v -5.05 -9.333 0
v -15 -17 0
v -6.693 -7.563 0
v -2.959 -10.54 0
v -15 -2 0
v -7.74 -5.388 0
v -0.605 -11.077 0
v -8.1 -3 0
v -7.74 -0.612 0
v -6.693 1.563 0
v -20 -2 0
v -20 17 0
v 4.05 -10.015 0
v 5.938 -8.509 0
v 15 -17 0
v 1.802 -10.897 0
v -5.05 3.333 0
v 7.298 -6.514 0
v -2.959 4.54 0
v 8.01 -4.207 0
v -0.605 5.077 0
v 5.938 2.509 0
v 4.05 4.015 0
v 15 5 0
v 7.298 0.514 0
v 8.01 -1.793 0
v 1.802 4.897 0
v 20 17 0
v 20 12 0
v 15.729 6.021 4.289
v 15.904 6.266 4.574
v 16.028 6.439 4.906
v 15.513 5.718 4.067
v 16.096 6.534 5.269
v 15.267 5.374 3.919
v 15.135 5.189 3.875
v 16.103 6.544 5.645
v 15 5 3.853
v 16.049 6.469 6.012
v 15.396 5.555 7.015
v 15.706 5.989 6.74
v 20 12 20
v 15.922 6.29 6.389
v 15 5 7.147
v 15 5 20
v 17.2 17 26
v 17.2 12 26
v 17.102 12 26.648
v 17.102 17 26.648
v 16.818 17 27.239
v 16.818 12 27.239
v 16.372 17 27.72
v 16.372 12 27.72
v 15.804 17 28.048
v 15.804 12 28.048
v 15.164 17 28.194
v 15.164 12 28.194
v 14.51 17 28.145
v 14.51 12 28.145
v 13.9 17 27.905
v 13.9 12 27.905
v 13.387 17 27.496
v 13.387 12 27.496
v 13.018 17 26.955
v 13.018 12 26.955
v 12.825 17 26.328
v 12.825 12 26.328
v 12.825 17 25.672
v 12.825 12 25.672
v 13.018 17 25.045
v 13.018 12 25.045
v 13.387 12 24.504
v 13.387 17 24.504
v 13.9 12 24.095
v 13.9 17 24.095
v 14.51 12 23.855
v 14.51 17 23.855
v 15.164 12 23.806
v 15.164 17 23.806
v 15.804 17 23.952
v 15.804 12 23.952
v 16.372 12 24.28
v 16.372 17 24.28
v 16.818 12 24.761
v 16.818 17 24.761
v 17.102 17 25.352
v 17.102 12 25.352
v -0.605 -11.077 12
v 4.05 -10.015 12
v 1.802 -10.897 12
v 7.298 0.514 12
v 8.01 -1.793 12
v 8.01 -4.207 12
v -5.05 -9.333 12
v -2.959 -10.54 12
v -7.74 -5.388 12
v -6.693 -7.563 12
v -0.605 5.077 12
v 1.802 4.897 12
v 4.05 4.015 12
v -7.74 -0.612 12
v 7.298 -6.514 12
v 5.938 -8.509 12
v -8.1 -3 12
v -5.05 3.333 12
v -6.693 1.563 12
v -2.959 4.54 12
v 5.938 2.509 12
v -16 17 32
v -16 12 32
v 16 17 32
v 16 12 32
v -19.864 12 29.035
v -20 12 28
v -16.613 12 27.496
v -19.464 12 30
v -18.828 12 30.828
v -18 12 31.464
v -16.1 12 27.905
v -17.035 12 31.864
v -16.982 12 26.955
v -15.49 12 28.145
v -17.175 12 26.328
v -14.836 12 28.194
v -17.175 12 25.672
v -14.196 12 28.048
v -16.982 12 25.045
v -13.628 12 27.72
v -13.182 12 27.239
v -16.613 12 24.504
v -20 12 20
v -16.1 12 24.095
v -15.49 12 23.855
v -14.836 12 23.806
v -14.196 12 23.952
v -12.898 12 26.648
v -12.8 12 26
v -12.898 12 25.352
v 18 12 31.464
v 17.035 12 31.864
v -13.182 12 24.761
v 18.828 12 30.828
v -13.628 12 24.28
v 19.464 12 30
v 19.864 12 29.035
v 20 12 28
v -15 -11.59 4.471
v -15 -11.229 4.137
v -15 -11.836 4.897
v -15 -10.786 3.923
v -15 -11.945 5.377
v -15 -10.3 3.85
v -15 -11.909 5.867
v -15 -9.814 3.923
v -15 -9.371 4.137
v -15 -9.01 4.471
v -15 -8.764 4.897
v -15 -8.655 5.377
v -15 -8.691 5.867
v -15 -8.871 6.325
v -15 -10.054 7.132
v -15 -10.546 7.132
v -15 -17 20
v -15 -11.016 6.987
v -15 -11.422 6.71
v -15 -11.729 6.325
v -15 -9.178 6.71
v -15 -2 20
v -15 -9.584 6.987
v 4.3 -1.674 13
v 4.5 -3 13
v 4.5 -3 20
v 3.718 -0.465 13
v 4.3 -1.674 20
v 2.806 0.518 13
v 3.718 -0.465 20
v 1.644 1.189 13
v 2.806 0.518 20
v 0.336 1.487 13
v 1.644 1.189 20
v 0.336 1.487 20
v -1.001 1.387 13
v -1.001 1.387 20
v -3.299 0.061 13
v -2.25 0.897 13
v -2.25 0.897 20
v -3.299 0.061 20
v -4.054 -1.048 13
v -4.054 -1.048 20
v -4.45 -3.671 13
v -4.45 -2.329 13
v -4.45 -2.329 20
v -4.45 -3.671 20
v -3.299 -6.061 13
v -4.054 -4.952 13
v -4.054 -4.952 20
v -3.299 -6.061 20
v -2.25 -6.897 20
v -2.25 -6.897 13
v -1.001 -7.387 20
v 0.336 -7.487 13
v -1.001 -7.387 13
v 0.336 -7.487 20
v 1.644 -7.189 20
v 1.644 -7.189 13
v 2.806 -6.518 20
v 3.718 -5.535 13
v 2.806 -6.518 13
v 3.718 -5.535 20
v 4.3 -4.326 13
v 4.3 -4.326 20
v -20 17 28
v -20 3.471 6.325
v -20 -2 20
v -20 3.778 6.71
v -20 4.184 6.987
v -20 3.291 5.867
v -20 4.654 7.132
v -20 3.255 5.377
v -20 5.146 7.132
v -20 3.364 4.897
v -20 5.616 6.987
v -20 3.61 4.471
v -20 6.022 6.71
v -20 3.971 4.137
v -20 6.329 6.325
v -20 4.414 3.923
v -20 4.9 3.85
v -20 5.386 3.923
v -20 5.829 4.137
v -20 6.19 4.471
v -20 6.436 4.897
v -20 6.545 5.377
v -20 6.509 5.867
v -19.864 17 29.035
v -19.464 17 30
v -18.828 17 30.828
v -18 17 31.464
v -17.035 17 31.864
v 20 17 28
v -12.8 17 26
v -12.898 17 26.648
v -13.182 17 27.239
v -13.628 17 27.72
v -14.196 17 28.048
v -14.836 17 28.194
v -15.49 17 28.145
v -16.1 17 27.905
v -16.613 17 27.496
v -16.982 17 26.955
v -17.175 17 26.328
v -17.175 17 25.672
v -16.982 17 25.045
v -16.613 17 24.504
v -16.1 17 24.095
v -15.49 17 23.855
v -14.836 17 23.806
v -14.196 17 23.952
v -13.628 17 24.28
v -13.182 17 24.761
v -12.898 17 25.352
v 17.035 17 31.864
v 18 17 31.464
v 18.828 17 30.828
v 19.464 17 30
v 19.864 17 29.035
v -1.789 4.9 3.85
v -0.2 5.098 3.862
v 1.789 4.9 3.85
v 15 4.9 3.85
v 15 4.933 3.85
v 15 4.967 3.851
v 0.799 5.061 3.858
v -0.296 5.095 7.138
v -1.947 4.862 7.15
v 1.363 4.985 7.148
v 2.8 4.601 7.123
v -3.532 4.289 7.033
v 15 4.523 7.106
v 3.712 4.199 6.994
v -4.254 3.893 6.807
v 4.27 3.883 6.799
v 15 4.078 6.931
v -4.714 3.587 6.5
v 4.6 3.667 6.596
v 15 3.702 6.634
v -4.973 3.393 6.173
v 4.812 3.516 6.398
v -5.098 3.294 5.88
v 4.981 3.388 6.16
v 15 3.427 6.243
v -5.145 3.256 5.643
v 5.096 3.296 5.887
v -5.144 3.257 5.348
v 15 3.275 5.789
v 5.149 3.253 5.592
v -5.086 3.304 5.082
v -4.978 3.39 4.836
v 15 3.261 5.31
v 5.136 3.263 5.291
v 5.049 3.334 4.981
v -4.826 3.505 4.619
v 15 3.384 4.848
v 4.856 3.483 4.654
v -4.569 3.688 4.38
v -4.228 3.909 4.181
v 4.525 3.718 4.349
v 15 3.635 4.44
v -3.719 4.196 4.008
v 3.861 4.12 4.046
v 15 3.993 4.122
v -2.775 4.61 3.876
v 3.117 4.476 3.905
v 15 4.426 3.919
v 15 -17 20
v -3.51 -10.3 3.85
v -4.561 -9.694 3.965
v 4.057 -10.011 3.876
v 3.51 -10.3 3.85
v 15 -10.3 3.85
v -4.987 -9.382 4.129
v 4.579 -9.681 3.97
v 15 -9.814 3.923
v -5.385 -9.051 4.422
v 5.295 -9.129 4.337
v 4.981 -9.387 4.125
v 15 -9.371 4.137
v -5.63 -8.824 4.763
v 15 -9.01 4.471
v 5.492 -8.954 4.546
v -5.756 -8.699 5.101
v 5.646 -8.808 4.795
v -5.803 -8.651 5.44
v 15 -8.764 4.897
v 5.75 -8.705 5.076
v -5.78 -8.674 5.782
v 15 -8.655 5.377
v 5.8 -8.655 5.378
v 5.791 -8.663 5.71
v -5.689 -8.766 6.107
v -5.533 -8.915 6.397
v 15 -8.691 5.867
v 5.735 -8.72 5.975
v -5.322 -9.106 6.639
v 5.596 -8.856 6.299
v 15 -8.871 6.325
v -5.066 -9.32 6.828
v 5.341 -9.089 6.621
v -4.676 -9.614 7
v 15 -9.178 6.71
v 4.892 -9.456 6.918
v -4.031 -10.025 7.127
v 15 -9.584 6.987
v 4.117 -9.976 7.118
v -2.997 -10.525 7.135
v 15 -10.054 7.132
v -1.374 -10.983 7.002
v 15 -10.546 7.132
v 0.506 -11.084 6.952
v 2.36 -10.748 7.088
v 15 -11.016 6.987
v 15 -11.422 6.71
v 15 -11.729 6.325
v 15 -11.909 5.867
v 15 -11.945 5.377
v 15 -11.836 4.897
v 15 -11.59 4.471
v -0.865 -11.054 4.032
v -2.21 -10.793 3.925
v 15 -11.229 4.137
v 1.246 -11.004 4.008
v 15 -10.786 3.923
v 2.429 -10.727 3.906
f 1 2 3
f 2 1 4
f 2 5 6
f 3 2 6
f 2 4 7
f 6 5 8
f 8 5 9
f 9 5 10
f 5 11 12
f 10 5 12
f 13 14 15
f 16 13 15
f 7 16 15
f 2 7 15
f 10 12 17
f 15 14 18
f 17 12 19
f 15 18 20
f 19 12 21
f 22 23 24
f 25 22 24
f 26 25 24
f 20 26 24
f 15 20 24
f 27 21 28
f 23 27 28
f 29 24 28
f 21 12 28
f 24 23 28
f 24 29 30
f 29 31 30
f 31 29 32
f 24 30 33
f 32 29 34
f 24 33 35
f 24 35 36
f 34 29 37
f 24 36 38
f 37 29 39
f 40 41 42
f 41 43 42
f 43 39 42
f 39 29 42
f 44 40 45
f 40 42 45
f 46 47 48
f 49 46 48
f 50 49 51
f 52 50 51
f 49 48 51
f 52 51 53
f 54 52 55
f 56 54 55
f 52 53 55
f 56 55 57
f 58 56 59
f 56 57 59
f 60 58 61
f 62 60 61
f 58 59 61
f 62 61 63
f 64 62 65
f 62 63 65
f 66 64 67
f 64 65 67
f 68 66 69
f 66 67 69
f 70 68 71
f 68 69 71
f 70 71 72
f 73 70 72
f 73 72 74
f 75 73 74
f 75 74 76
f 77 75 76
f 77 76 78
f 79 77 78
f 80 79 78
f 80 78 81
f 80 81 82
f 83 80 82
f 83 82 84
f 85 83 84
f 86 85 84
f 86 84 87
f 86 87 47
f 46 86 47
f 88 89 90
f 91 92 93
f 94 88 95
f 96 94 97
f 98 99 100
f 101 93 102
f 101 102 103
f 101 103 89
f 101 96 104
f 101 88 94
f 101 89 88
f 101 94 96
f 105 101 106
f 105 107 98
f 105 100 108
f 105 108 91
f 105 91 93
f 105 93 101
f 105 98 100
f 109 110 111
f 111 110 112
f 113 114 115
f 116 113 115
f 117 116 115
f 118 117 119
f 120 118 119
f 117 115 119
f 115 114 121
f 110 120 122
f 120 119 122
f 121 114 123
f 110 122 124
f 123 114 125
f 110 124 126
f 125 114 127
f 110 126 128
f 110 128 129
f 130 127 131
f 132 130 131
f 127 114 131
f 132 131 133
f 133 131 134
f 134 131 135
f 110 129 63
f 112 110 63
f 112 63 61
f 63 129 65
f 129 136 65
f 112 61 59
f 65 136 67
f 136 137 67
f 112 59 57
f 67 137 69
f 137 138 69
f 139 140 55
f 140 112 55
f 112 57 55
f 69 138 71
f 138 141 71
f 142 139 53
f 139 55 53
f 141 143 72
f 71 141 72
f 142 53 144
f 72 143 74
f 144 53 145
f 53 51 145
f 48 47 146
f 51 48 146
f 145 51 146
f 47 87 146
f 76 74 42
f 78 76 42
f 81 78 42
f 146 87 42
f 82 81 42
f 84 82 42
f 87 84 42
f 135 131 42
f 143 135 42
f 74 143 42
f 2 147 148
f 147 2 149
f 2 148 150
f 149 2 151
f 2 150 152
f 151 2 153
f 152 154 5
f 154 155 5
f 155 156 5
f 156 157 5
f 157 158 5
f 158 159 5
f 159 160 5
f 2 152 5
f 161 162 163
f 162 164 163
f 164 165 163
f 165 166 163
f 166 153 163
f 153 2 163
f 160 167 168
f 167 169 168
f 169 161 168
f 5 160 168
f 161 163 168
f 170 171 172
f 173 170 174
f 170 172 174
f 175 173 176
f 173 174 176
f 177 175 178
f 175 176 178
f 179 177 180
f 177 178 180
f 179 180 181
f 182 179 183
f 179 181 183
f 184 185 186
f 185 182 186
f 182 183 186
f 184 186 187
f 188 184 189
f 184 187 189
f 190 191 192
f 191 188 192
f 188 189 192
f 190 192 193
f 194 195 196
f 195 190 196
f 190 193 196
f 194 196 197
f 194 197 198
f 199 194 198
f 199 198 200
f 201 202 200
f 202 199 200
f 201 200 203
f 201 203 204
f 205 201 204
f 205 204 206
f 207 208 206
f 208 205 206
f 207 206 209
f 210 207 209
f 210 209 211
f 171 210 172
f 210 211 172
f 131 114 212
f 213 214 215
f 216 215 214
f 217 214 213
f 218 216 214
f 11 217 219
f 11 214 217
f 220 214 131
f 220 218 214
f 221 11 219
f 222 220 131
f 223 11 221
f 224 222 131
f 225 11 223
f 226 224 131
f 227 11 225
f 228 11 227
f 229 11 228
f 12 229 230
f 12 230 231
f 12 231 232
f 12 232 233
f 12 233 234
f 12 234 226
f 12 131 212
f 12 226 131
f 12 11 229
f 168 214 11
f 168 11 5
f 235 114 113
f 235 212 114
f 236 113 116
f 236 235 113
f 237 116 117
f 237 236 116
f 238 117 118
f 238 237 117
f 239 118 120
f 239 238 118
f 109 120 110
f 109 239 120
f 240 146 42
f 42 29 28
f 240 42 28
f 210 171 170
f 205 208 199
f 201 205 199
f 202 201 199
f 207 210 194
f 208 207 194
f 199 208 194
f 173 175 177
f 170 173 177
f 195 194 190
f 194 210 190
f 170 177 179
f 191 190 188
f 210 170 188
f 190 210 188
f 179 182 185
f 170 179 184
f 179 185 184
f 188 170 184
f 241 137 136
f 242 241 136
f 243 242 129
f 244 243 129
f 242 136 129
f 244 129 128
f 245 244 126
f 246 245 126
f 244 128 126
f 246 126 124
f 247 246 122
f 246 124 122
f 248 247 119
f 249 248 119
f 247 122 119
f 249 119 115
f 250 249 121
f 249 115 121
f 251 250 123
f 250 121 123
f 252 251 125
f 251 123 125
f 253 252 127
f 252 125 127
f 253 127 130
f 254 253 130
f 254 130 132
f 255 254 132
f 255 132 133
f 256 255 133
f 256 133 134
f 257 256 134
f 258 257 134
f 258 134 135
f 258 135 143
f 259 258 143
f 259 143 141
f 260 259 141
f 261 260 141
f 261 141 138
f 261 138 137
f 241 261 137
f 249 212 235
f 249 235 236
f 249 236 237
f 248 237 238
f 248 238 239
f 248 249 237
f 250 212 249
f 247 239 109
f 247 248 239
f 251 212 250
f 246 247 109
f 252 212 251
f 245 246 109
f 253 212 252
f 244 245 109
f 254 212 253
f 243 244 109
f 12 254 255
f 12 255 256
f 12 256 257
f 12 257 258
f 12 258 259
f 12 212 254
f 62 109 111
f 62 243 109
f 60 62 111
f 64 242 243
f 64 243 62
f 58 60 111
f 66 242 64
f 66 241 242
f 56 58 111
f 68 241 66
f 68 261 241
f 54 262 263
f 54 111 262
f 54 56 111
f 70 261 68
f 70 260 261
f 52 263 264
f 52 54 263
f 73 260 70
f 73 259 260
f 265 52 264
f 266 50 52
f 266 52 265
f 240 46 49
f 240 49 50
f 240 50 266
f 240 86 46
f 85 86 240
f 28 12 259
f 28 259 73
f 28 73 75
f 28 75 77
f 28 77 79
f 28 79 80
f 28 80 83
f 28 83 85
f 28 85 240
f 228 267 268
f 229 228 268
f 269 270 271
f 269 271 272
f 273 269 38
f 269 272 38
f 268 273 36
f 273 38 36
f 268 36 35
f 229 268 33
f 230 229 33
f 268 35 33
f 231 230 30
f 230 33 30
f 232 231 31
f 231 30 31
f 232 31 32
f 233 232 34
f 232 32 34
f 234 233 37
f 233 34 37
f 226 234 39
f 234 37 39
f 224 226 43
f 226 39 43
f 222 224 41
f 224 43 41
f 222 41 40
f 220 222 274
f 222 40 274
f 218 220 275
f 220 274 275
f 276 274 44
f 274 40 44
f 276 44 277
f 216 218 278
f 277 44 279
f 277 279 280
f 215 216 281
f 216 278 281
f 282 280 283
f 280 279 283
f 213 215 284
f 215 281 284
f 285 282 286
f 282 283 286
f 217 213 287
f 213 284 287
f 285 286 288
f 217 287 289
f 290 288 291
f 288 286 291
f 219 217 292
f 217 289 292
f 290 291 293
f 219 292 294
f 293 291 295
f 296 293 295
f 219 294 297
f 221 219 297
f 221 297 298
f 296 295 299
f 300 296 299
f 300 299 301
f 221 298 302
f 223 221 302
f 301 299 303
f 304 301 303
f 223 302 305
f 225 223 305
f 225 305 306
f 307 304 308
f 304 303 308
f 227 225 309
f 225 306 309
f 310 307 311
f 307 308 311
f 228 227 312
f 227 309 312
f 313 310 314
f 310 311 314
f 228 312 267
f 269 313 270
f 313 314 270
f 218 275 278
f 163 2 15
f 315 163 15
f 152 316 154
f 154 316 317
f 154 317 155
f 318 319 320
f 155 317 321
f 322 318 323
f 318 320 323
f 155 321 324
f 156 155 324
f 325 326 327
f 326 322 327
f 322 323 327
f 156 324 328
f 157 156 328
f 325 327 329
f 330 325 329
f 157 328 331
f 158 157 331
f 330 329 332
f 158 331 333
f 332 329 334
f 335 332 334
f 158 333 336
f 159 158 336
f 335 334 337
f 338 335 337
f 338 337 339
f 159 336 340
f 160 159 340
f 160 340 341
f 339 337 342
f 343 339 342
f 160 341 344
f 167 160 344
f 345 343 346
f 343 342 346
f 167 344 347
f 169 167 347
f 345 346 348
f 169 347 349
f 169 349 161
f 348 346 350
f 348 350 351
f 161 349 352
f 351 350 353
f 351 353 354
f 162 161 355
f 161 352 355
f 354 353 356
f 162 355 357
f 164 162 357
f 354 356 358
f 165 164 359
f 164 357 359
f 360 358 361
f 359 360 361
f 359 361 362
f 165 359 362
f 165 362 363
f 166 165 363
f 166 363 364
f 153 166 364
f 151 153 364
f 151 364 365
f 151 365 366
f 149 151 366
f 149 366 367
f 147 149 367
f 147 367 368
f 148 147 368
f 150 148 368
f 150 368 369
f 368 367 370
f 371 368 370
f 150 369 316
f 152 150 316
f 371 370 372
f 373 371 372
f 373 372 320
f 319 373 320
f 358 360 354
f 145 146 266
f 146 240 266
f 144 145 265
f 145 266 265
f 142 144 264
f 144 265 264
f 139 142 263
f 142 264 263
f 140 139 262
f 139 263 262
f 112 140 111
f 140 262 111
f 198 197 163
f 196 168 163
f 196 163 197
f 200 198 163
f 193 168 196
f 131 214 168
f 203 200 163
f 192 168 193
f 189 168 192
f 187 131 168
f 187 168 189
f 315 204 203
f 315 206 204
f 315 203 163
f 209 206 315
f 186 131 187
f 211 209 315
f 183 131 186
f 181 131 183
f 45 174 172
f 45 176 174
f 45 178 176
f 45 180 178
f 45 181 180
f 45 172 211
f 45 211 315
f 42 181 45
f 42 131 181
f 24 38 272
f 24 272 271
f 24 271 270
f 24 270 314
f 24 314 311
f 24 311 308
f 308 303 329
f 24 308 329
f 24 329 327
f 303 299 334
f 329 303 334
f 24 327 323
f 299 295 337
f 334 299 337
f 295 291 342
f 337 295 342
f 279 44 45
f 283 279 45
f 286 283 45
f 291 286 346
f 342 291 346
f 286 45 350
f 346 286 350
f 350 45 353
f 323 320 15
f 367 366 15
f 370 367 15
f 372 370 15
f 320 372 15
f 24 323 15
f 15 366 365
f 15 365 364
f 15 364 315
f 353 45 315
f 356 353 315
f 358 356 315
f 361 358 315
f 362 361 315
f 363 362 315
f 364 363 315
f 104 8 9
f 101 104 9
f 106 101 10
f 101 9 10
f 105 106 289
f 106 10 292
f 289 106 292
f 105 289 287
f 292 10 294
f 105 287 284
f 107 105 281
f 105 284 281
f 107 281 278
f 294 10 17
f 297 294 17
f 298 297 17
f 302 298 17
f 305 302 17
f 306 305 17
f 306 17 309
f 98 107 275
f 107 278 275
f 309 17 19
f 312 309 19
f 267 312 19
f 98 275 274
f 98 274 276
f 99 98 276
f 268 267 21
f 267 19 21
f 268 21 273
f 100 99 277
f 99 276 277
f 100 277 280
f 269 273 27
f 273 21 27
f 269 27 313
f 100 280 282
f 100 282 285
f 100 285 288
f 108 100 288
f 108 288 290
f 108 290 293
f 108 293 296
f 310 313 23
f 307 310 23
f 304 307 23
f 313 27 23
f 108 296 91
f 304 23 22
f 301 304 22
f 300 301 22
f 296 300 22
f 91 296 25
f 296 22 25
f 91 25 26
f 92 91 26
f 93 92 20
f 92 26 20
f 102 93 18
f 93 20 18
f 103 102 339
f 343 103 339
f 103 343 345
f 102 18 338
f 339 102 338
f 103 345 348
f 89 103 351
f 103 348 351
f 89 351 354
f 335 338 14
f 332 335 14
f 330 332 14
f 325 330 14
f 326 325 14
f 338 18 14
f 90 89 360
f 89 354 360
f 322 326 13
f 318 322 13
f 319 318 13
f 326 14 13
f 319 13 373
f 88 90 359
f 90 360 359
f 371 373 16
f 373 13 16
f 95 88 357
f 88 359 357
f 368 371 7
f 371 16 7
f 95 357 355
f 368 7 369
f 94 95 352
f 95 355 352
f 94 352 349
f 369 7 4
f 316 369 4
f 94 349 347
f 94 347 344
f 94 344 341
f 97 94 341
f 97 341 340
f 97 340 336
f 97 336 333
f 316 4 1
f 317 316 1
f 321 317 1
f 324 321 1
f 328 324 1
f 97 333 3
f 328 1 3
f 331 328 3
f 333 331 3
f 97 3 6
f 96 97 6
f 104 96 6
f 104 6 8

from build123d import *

# Parameters (mm, degrees)
ESQUISSE1_W                  = 40
ESQUISSE1_H                  = 34
BOSS_EXTRU_1_DEPTH           = 20
ESQUISSE2_W                  = 40
ESQUISSE2_H                  = 5
BOSS_EXTRU_3_DEPTH           = 20
ESQUISSE4_R                  = 4.5
ENL_V_MAT_EXTRU_1_DEPTH      = 21
ESQUISSE5_R                  = 8.1
ENL_V_MAT_EXTRU_2_DEPTH      = 12
ENL_V_MAT_EXTRU_3_DEPTH      = 21
ESQUISSE8_R                  = 2.2
ENL_V_MAT_EXTRU_5_DEPTH      = 6
ESQUISSE10_R                 = 4.5
BOSS_EXTRU_4_DEPTH           = 1
ESQUISSE11_W                 = 40
ESQUISSE11_H                 = 8
ENL_V_MAT_EXTRU_6_DEPTH      = 6
CONG_6_R                     = 4
ESQUISSE14_R                 = 1.65
ENL_V_MAT_EXTRU_7_DEPTH      = 6
ENL_V_MAT_EXTRU_7_DEPTH_BACK = 36


with BuildPart() as part:
    # Esquisse1 → Boss.-Extru.1 (new body)
    with BuildSketch(Plane.XY):
        Rectangle(ESQUISSE1_W, ESQUISSE1_H)
    extrude(amount=BOSS_EXTRU_1_DEPTH)

    # Esquisse2 → Boss.-Extru.3 (add)
    with BuildSketch(Plane.XY.offset(20)):
        with Locations((0, 14.5)):
            Rectangle(ESQUISSE2_W, ESQUISSE2_H)
    extrude(amount=BOSS_EXTRU_3_DEPTH)

    # Esquisse4 → Enlèv. mat.-Extru.1 (cut, through all)
    with BuildSketch(Plane.XY.offset(20)):
        with Locations((0, -3)):
            Circle(ESQUISSE4_R)
    extrude(amount=-ENL_V_MAT_EXTRU_1_DEPTH, mode=Mode.SUBTRACT)

    # Esquisse5 → Enlèv. mat.-Extru.2 (cut)
    with BuildSketch(Plane(origin=(0, 0, 0), x_dir=(-1, 0, 0), z_dir=(0, 0, -1))):
        with Locations((0, -3)):
            Circle(ESQUISSE5_R)
    extrude(amount=-ENL_V_MAT_EXTRU_2_DEPTH, mode=Mode.SUBTRACT)

    # Esquisse6 → Enlèv. mat.-Extru.3 (cut, through all)
    with BuildSketch(Plane.XY.offset(20)):
        Polygon((-20, -17), (-20, -2), (-15, -2), (-15, -7), (-15, -17), align=None)
        Polygon((20, 12), (15, 5), (15, -17), (20, -17), align=None)
    extrude(amount=-ENL_V_MAT_EXTRU_3_DEPTH, mode=Mode.SUBTRACT)

    # Esquisse8 → Enlèv. mat.-Extru.5 (cut, through all)
    with BuildSketch(Plane.XZ.offset(-12)):
        with Locations((-15, 26)):
            Circle(ESQUISSE8_R)
        with Locations((15, 26)):
            Circle(ESQUISSE8_R)
    extrude(amount=-ENL_V_MAT_EXTRU_5_DEPTH, mode=Mode.SUBTRACT)

    # Esquisse10 → Boss.-Extru.4 (add)
    with BuildSketch(Plane(origin=(0, 0, 12), x_dir=(-1, 0, 0), z_dir=(0, 0, -1))):
        with Locations((0, -3)):
            Circle(ESQUISSE10_R)
    extrude(amount=-BOSS_EXTRU_4_DEPTH)

    # Esquisse11 → Enlèv. mat.-Extru.6 (cut, through all)
    with BuildSketch(Plane.XZ.offset(-12)):
        with Locations((0, 36)):
            Rectangle(ESQUISSE11_W, ESQUISSE11_H)
    extrude(amount=-ENL_V_MAT_EXTRU_6_DEPTH, mode=Mode.SUBTRACT)

    # Congé6
    cong_6_edges = [part.edges().sort_by_distance(p)[0] for p in [
        (-20, 14.5, 32),
        (20, 14.5, 32),
    ]]
    fillet(cong_6_edges, radius=CONG_6_R)

    # Esquisse14 → Enlèv. mat.-Extru.7 (cut, two sides)
    with BuildSketch(Plane(origin=(15, 0, 0), x_dir=(0, 0, -1), z_dir=(1, 0, 0))) as enl_v_mat_extru_7_sk:
        with Locations((-5.5, -10.3)):
            Circle(ESQUISSE14_R)
        with Locations((-5.5, 4.9)):
            Circle(ESQUISSE14_R)
    extrude(amount=ENL_V_MAT_EXTRU_7_DEPTH, mode=Mode.SUBTRACT)
    extrude(enl_v_mat_extru_7_sk.sketch, amount=-ENL_V_MAT_EXTRU_7_DEPTH_BACK, mode=Mode.SUBTRACT)


solid = part.part
